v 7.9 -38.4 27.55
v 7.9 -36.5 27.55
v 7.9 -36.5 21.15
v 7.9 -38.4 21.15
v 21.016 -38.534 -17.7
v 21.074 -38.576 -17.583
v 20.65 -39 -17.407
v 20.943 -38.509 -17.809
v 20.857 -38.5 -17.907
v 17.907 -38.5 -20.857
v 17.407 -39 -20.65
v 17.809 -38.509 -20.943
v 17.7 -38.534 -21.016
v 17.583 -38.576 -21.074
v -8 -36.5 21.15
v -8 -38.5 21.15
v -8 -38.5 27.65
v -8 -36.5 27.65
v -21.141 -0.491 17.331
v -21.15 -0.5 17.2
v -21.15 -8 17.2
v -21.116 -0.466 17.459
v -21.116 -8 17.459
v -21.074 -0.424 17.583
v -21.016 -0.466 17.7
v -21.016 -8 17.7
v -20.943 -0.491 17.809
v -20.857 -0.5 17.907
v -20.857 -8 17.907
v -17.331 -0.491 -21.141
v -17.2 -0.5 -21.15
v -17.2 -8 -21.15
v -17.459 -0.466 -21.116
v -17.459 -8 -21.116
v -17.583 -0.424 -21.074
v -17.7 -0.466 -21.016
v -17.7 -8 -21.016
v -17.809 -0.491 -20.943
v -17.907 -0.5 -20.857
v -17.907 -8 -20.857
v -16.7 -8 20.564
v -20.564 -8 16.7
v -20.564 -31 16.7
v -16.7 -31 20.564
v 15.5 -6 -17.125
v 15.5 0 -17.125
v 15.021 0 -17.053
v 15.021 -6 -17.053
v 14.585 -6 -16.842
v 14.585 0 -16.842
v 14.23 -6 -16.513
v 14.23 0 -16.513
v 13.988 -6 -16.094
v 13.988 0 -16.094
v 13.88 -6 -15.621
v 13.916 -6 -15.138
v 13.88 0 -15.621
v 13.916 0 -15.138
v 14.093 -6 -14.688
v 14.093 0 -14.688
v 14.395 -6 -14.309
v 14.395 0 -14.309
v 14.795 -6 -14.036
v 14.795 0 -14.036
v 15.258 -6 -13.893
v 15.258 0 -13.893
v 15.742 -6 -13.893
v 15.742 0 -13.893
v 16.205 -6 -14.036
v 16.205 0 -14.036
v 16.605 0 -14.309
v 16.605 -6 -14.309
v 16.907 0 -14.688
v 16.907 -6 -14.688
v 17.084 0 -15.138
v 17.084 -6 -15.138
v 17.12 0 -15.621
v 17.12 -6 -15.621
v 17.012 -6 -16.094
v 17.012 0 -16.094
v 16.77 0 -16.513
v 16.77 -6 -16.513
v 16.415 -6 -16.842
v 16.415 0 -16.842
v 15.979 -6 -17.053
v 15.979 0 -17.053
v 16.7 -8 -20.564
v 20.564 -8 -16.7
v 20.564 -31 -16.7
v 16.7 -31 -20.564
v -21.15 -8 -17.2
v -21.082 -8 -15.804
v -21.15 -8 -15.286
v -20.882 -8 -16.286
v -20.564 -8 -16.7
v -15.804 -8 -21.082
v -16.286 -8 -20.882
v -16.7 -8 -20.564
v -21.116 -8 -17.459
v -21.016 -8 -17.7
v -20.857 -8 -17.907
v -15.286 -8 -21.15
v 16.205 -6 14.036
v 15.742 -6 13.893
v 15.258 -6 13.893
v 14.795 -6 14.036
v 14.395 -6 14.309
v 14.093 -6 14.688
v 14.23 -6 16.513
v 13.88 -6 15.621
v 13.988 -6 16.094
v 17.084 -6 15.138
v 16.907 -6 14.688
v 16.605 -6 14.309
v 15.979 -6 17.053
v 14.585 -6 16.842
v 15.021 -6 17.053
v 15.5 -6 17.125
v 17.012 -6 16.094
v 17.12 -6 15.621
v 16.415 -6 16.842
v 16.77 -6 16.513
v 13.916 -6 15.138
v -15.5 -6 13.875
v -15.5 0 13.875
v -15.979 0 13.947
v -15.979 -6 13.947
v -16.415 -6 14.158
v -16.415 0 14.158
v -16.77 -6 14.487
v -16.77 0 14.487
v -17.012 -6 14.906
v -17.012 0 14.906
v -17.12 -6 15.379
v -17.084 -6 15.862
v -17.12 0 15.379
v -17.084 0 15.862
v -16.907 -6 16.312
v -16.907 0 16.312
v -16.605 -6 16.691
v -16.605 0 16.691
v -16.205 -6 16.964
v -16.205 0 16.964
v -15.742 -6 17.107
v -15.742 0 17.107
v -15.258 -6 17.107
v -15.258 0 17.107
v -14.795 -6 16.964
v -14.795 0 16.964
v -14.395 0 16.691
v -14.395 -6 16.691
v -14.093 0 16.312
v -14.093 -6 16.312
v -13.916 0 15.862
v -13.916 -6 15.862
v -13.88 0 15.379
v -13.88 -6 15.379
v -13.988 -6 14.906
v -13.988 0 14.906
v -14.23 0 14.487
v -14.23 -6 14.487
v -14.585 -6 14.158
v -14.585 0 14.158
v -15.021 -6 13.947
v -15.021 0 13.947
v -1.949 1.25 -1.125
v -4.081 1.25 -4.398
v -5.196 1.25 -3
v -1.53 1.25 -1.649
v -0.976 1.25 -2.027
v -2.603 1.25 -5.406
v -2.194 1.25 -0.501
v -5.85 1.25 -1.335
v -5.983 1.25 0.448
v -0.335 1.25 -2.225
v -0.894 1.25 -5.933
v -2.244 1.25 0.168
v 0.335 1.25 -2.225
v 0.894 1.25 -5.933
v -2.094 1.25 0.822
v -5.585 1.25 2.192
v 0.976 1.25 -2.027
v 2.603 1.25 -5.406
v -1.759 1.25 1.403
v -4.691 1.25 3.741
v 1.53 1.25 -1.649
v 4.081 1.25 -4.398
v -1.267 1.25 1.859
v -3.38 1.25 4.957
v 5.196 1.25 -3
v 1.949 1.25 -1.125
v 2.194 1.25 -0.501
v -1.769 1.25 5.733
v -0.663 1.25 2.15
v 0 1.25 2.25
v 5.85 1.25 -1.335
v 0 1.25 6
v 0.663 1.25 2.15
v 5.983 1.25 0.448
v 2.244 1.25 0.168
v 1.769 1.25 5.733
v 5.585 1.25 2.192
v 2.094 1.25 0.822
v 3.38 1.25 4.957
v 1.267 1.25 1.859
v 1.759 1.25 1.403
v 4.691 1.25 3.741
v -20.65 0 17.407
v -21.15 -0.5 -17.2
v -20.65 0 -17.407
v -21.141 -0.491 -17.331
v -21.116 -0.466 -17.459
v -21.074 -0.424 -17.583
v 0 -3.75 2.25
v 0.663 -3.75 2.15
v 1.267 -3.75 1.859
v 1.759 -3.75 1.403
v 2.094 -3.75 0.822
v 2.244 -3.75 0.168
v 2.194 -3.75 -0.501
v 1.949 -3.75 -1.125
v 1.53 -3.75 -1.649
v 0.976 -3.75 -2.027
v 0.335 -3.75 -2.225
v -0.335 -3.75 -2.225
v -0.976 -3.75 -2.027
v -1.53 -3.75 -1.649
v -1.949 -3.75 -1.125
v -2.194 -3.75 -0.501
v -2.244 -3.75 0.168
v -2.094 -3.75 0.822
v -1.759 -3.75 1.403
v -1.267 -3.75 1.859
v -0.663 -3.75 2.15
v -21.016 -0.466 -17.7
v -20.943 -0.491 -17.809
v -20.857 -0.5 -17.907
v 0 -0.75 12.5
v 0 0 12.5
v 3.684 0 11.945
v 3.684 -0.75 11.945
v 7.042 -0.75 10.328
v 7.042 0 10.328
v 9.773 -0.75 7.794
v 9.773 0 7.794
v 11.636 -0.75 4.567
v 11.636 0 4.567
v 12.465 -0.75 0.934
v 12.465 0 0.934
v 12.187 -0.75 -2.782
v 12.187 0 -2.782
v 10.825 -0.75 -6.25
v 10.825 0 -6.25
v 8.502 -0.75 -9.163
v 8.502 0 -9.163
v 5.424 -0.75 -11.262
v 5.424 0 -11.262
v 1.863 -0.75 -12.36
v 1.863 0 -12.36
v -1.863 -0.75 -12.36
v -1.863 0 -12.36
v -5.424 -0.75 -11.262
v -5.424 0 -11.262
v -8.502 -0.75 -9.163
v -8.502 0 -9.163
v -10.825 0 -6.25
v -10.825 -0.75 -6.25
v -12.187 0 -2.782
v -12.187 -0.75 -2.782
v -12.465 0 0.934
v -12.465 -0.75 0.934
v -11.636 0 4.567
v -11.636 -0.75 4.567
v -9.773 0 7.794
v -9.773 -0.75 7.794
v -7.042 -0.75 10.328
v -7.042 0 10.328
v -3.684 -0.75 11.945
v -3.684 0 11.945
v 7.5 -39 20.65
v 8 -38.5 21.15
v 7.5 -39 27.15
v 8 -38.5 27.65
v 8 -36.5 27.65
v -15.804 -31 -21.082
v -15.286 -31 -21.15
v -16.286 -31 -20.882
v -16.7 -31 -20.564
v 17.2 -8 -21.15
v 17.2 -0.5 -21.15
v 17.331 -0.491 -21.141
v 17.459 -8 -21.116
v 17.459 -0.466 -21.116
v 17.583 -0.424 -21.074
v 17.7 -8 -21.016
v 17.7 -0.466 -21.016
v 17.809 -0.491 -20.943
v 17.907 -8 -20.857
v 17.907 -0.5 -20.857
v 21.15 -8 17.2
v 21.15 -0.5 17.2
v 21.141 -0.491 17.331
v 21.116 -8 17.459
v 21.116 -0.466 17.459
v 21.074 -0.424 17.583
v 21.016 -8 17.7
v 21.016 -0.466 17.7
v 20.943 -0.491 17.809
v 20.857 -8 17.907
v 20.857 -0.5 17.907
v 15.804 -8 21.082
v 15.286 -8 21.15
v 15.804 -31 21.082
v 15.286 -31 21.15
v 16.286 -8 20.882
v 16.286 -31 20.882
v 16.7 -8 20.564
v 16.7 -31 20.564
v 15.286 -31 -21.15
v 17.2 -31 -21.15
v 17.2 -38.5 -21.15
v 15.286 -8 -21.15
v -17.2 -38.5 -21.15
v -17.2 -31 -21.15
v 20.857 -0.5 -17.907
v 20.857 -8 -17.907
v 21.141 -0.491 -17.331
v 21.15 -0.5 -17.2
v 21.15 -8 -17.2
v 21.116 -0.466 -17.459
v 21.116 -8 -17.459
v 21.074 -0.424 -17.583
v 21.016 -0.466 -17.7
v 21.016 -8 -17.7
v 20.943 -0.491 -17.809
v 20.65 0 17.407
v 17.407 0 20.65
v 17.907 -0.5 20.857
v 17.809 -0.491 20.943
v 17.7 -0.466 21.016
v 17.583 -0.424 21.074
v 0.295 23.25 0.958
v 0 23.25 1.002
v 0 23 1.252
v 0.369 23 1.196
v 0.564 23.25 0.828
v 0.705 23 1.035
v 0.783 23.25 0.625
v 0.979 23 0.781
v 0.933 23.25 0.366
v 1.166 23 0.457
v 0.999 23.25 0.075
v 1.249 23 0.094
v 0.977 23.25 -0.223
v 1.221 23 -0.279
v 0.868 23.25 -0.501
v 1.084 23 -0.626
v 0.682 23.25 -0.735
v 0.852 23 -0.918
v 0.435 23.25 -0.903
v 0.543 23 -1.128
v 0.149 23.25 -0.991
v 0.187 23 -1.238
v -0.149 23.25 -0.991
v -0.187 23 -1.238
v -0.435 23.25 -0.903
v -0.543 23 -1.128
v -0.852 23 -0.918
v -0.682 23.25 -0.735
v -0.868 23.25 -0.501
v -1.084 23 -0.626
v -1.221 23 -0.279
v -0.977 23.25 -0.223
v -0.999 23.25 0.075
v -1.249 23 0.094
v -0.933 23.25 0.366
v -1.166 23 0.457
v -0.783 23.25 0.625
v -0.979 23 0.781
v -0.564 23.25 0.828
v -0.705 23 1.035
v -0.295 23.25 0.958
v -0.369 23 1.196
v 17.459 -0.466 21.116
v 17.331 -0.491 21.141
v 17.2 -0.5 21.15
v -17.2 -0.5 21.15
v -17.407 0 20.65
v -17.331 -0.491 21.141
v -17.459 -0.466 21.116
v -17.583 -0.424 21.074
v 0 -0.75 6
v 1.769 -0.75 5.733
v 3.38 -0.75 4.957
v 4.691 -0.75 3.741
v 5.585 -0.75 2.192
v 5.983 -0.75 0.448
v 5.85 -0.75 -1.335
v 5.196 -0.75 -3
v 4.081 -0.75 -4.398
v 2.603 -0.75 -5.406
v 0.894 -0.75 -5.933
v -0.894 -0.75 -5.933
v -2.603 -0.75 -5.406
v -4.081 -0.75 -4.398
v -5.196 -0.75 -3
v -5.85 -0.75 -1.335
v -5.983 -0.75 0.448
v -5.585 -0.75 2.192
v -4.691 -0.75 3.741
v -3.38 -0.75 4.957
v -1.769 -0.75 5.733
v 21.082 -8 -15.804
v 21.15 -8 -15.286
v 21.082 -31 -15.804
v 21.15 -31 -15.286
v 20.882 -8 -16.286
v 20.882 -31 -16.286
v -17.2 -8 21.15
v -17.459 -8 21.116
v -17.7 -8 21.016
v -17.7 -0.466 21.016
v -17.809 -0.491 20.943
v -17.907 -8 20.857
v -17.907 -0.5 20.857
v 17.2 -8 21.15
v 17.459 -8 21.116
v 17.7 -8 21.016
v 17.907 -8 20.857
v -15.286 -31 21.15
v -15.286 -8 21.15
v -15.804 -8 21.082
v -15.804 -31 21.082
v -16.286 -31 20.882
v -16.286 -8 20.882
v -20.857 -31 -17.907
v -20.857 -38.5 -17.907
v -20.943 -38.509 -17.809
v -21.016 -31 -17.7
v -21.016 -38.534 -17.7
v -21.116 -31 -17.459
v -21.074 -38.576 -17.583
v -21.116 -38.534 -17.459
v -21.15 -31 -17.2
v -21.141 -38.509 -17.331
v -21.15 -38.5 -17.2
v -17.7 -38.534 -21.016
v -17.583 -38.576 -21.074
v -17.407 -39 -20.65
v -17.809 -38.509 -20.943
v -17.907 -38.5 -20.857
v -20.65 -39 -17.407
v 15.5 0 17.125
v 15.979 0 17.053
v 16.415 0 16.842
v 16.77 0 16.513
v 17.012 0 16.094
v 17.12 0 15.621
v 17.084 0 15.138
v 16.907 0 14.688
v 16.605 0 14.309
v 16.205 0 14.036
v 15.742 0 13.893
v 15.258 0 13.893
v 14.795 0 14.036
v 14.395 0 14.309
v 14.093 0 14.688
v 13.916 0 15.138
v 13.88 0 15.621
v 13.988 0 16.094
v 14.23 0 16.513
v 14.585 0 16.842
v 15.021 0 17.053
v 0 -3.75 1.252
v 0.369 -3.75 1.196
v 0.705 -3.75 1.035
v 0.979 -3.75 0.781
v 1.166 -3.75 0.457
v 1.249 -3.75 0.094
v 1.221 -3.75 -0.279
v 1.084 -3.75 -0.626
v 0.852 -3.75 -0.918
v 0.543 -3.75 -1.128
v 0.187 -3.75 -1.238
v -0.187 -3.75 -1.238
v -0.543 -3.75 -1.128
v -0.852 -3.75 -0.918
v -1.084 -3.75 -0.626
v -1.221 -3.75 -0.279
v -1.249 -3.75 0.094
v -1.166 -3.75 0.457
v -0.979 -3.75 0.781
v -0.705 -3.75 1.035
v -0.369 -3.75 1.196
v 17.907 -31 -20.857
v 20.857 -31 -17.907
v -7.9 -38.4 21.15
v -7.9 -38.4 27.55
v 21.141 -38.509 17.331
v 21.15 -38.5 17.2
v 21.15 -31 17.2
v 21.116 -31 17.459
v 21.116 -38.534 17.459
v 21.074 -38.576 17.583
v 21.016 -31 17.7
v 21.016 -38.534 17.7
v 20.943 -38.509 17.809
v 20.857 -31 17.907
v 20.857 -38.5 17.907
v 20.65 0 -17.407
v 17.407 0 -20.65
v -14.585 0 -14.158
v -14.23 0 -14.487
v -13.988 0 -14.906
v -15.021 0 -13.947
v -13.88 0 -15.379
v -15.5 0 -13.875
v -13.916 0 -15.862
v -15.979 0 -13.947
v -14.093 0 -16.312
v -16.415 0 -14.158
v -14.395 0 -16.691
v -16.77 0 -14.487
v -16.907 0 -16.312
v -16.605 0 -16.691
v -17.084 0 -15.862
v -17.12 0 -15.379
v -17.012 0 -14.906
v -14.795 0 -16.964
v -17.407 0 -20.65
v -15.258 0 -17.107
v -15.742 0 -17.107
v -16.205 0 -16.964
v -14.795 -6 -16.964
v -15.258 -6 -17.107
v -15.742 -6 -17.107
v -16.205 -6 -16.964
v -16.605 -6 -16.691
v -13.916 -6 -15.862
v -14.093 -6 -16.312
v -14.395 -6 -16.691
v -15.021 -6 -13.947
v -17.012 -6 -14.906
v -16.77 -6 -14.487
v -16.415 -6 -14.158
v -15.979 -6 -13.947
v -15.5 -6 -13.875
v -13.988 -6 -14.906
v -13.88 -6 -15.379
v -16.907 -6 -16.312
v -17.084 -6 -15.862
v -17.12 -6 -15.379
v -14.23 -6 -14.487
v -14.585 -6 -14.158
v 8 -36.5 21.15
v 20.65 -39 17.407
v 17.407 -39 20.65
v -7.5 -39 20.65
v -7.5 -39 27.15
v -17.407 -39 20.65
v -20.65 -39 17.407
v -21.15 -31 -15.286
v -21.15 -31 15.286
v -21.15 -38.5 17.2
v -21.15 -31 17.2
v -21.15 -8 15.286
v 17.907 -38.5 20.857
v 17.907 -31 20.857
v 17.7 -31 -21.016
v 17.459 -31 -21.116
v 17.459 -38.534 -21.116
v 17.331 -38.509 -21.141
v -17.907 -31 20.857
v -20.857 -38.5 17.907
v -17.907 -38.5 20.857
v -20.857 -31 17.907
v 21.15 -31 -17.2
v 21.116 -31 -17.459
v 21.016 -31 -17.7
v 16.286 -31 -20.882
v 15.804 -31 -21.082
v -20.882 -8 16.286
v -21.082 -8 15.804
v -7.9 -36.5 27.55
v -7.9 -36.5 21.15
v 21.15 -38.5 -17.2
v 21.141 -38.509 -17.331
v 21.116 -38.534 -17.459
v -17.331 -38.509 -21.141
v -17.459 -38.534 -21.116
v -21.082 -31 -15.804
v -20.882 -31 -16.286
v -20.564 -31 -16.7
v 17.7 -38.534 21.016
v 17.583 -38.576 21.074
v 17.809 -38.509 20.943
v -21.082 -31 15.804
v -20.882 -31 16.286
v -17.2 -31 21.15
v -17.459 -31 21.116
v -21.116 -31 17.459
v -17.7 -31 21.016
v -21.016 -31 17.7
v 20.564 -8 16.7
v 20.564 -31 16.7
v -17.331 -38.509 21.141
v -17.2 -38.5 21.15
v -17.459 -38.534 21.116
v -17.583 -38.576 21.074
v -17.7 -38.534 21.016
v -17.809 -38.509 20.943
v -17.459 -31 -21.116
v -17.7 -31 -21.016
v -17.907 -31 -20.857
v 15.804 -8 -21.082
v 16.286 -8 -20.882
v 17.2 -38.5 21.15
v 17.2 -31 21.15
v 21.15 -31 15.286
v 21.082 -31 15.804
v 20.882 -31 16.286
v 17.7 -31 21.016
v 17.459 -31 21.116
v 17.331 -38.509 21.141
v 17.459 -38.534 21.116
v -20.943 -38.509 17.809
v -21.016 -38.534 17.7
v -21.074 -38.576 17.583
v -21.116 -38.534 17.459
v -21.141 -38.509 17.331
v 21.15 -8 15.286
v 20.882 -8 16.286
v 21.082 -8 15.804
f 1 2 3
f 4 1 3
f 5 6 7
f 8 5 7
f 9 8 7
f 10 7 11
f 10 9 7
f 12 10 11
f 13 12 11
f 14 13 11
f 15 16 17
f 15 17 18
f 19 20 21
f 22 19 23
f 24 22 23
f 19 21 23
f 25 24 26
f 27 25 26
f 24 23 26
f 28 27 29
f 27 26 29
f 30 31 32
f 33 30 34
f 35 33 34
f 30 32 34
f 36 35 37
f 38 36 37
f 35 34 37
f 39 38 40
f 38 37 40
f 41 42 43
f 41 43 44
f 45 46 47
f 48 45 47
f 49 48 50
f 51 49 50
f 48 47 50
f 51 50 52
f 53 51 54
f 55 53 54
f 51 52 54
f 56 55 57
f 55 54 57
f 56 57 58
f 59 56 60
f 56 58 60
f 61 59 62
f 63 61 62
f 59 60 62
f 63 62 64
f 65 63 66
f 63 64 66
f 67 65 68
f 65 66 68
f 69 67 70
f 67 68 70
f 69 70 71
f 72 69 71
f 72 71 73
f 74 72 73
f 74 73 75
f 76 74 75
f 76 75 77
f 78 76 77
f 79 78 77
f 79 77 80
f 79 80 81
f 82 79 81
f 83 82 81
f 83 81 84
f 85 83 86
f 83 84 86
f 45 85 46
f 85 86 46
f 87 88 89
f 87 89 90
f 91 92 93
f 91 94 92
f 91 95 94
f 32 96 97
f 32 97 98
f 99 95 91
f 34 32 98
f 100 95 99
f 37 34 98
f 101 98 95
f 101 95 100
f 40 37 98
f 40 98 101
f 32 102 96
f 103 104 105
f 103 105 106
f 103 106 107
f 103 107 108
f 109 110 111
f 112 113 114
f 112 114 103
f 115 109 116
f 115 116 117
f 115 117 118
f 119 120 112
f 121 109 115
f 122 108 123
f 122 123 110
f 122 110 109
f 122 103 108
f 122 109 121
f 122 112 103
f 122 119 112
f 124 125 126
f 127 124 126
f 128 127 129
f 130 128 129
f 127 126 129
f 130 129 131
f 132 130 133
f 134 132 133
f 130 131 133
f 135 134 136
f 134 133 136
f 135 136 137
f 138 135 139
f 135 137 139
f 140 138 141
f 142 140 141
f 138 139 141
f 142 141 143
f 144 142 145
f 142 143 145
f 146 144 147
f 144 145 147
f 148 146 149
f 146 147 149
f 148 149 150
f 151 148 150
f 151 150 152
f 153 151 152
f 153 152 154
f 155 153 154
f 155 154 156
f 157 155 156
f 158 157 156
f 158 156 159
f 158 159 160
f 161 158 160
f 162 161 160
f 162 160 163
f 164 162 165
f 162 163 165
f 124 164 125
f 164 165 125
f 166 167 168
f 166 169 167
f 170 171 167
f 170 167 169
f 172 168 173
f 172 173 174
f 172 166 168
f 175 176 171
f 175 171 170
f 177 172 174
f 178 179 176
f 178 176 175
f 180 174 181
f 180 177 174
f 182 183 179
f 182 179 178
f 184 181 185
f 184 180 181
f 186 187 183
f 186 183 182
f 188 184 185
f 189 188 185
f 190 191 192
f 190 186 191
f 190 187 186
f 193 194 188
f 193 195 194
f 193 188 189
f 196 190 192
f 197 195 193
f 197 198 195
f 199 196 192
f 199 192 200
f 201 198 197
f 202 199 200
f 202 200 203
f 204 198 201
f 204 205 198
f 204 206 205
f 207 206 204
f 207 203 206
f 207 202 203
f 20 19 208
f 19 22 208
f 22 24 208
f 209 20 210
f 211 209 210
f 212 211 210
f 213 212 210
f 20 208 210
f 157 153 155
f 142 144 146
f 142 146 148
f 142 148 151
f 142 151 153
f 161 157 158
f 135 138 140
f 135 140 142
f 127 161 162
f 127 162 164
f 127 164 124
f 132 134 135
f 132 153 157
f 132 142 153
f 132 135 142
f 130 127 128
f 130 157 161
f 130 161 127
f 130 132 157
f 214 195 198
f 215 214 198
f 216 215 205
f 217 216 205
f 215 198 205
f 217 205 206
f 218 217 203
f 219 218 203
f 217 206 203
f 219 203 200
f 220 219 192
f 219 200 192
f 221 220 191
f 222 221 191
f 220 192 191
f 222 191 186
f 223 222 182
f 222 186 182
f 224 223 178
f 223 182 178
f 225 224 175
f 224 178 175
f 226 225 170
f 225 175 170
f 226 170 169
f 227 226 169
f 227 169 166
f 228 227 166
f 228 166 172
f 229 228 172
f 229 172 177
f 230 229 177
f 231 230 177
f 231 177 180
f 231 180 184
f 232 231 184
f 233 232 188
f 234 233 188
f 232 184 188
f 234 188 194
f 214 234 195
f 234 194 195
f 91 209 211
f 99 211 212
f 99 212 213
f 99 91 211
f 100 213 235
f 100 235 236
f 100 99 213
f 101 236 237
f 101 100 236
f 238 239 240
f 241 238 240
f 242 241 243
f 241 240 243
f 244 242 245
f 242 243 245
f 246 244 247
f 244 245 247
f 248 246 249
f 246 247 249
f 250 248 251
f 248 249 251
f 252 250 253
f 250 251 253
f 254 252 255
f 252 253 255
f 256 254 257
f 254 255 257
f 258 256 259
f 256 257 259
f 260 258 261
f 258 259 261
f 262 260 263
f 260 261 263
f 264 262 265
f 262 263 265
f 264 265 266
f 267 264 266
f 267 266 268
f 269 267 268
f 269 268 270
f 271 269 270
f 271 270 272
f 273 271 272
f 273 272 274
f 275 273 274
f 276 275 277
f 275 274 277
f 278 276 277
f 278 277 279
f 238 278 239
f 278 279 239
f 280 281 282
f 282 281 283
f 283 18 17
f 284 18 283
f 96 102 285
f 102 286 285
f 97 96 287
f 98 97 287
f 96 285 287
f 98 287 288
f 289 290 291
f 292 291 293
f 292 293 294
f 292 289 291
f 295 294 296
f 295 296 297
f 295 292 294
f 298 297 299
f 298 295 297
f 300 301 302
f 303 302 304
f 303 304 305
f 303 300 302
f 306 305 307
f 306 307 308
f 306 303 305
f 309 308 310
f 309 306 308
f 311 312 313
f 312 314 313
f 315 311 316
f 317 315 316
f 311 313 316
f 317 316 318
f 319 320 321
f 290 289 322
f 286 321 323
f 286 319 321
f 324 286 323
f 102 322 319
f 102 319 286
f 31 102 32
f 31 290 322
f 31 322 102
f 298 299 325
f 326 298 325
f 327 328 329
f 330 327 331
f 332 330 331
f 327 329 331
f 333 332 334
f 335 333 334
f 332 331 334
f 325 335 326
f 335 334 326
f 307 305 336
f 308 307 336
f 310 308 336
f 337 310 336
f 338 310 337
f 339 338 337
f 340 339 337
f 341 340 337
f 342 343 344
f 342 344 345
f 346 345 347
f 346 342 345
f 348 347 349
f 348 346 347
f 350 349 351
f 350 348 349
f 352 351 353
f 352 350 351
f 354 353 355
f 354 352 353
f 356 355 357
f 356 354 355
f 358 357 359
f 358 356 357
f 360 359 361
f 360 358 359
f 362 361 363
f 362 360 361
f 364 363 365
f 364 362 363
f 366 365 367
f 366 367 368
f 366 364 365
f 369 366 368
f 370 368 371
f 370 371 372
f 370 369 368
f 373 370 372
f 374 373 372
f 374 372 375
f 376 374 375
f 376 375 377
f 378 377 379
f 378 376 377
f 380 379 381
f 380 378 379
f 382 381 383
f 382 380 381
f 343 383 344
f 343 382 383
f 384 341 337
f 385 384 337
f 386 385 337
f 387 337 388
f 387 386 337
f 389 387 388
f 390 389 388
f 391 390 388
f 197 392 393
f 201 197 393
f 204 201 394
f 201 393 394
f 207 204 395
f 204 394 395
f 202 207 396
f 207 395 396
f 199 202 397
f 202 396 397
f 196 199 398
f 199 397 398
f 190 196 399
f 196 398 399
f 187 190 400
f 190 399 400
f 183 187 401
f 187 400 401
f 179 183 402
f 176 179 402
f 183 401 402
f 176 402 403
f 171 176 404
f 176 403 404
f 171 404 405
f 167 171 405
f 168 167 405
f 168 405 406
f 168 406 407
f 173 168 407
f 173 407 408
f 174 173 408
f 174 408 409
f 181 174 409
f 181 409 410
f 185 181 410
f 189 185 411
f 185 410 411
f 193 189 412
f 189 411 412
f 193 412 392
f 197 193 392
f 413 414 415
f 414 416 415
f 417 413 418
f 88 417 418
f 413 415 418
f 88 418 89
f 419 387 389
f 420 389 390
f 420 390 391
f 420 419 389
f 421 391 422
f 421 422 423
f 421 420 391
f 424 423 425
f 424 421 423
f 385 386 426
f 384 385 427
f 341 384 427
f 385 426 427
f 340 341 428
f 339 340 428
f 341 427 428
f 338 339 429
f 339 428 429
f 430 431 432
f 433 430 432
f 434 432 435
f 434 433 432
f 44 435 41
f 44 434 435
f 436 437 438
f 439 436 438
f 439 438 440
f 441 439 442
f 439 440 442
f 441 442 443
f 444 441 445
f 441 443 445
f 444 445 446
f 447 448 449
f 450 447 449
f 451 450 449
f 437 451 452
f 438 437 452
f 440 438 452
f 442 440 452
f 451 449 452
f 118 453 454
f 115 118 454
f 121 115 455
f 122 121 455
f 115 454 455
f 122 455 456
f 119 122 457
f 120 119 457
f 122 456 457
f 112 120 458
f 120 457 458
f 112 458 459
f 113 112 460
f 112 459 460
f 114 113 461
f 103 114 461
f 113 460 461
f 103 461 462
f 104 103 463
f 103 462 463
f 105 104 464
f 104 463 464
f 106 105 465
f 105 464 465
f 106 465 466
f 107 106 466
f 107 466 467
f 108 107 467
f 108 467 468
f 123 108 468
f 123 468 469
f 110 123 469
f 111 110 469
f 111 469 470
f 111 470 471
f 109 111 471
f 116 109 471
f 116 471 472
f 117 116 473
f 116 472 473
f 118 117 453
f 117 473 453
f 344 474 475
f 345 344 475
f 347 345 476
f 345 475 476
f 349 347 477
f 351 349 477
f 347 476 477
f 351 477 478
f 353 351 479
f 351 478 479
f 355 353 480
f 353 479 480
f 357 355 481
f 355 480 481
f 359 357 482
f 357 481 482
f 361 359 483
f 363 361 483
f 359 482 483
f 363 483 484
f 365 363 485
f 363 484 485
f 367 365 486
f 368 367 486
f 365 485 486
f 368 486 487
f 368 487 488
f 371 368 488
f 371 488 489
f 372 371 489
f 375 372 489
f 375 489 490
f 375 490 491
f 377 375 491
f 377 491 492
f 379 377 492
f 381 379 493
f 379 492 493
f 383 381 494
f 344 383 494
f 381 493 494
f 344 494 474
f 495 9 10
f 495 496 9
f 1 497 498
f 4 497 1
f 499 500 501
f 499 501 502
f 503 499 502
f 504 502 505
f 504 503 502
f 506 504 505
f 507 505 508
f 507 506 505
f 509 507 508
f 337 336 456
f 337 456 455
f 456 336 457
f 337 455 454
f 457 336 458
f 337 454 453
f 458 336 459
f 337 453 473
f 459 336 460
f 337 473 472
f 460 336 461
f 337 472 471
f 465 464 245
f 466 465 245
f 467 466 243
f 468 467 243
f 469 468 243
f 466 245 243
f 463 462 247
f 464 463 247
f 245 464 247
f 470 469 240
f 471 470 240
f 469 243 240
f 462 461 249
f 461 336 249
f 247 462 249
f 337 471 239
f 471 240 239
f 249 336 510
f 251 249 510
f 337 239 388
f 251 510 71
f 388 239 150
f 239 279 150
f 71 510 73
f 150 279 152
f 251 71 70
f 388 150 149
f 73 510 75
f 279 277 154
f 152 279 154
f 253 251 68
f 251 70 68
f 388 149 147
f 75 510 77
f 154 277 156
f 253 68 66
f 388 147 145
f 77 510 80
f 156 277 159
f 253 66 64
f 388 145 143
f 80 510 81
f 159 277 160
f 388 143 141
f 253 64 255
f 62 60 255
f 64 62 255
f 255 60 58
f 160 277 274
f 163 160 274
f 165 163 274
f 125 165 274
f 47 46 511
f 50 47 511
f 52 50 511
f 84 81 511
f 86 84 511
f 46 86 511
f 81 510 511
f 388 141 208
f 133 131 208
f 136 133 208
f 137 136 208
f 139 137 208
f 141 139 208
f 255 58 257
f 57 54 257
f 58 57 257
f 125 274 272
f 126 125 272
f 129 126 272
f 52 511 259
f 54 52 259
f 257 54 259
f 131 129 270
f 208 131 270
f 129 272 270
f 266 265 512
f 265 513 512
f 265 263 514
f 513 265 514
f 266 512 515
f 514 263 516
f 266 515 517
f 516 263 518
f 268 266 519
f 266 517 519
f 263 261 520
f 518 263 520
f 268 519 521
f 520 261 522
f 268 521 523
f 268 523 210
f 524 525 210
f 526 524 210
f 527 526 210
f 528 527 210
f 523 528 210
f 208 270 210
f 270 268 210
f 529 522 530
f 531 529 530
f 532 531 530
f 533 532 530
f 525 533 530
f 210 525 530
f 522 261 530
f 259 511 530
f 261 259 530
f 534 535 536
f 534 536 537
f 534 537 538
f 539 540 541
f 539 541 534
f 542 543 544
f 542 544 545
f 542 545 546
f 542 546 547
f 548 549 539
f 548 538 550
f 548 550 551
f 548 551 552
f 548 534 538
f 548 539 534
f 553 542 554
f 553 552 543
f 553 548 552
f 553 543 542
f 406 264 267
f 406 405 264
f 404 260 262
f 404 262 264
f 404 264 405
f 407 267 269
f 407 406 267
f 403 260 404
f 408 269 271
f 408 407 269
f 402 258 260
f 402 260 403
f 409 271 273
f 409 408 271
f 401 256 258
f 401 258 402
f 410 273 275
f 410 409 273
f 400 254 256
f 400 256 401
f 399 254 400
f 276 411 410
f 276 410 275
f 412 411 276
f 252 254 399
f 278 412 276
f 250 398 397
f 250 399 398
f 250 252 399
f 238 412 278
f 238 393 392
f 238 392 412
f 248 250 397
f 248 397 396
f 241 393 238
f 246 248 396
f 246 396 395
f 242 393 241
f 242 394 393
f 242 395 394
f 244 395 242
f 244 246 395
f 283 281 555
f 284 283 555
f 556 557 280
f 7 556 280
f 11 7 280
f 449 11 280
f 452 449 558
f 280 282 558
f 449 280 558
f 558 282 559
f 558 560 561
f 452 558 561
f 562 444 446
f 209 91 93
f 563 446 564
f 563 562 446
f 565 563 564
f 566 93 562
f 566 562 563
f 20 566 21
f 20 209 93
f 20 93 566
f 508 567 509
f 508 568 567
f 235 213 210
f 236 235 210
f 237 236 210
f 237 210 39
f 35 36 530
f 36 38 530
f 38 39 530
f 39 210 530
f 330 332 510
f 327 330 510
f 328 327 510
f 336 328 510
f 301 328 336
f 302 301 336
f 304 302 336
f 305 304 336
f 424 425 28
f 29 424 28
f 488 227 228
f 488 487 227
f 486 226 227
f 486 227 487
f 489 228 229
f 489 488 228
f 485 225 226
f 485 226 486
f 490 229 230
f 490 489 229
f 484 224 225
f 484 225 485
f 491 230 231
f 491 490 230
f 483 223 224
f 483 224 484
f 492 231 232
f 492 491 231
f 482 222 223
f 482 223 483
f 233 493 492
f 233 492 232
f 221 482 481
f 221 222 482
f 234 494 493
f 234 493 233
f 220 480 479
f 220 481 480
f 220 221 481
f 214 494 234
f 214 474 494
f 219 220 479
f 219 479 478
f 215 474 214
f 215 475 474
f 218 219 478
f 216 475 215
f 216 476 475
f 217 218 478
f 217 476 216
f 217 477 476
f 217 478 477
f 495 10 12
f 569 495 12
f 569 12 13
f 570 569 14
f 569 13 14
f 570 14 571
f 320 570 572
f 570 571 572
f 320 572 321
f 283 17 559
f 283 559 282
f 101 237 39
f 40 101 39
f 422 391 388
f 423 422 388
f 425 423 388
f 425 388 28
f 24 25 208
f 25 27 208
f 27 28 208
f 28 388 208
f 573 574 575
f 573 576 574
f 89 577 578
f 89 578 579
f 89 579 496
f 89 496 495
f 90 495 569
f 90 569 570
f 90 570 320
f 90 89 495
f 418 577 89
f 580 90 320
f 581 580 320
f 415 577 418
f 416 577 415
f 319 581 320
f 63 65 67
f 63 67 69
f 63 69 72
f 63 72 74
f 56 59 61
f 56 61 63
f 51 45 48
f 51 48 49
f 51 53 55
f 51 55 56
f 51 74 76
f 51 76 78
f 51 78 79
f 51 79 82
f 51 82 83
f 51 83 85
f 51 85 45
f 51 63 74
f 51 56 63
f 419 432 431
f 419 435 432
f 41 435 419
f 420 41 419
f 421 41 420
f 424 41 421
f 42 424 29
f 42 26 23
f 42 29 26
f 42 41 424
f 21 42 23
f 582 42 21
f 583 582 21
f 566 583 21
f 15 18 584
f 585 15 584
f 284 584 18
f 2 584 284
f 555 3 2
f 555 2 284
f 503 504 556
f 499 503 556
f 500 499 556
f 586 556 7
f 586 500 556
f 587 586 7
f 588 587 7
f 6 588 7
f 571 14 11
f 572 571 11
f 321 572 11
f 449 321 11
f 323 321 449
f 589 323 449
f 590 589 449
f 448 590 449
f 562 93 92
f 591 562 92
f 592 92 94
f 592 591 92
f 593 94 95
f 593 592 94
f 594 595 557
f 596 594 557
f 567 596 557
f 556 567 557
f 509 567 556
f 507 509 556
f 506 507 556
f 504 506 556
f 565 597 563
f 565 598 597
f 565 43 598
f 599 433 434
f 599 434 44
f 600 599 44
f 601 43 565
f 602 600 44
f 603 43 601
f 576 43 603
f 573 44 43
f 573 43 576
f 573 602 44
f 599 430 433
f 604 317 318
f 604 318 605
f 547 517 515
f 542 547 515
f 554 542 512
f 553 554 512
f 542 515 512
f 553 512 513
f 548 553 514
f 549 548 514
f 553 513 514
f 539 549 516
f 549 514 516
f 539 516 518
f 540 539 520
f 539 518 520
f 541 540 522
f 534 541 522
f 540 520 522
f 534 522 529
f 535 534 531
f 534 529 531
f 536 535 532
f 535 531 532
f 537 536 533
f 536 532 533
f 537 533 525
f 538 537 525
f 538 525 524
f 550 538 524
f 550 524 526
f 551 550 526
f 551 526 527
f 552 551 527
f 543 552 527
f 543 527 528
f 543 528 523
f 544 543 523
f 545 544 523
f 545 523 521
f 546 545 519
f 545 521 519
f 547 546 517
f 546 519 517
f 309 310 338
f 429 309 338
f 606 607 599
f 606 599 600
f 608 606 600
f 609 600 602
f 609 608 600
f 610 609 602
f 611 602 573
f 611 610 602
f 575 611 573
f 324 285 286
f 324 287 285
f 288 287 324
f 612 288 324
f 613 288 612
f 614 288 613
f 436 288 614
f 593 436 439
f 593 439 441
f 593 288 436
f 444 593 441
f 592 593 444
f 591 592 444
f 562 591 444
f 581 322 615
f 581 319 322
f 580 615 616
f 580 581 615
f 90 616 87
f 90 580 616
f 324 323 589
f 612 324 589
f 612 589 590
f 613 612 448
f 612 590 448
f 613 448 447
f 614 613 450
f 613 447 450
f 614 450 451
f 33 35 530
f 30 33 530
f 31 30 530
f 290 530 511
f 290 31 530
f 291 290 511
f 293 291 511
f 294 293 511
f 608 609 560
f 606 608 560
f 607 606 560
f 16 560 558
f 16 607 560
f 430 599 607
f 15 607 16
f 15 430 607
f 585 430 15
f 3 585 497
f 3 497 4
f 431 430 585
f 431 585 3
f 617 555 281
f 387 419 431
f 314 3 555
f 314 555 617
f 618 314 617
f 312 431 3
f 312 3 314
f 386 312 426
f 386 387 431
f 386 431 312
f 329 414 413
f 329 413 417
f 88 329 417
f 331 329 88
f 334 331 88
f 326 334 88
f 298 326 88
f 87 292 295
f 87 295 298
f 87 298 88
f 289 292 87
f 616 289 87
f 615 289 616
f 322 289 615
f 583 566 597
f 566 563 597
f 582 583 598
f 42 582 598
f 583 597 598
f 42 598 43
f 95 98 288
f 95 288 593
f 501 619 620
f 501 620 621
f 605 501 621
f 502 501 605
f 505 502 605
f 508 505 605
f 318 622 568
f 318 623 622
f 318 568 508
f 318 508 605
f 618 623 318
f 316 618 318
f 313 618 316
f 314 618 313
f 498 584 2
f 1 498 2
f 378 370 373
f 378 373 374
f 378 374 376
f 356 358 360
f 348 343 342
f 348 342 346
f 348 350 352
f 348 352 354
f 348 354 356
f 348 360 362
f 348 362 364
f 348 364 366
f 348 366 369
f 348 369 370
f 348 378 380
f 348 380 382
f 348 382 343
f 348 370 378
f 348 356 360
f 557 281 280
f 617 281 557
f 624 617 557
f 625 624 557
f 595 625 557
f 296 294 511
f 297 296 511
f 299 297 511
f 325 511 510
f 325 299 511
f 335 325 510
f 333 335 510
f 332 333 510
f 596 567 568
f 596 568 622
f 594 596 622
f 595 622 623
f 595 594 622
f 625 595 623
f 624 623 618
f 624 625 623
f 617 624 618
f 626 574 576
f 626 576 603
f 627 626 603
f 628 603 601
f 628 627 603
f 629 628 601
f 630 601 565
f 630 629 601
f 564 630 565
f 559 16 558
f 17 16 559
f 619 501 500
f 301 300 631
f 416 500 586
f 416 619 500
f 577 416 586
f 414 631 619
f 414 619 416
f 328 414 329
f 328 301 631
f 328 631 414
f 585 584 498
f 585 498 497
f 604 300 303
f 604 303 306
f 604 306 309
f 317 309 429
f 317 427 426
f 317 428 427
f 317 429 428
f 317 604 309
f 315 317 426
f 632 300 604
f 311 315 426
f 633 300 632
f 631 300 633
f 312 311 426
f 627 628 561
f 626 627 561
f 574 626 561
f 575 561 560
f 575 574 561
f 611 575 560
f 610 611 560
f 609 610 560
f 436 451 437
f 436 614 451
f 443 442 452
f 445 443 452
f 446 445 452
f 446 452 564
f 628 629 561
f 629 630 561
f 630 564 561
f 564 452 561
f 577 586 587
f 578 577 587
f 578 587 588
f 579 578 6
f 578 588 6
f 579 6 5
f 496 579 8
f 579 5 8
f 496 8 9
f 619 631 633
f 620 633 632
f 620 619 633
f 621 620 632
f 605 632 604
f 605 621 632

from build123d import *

# Parameters (mm, degrees)
BOSS_EXTRUDE1_DEPTH  = 8
SKETCH2_R            = 1.624765057
CUT_EXTRUDE1_DEPTH   = 6
CHAMFER1_SIZE        = 0.5
SKETCH3_W            = 32.228932188
SKETCH3_H            = 1
CUT_EXTRUDE2_DEPTH   = 48.964700562
SKETCH4_W            = 32.228932188
SKETCH4_H            = 1
CUT_EXTRUDE3_DEPTH   = 48.964700562
CUT_EXTRUDE4_DEPTH   = 1
MIRROR2_COPY_1_DEPTH = 1
BOSS_EXTRUDE2_DEPTH  = 24
BOSS_EXTRUDE4_DEPTH  = 8
SKETCH22_W           = 16
SKETCH22_H           = 2.5
BOSS_EXTRUDE5_DEPTH  = 6.5
CHAMFER3_SIZE        = 0.5
SKETCH23_W           = 15.8
SKETCH23_H           = 6.4
CUT_EXTRUDE5_DEPTH   = 1.9
SKETCH24_R           = 12.5
CUT_EXTRUDE6_DEPTH   = 0.75
SKETCH25_R           = 6
BOSS_EXTRUDE6_DEPTH  = 2
SKETCH26_R           = 2.25
CUT_EXTRUDE7_DEPTH   = 5
SKETCH27_R           = 1.25207439
BOSS_EXTRUDE7_DEPTH  = 27
CHAMFER5_SIZE        = 0.25
FILLET1_R            = 2
FILLET3_R            = 1
FILLET4_R            = 1


with BuildPart() as part:
    # Sketch1 → Boss-Extrude1 (new body)
    with BuildSketch(Plane(origin=(0, 0, 0), x_dir=(1, 0, 0), z_dir=(0, 1, 0))):
        Polygon((-21.15, -17.614466094), (-21.15, 17.614466094), (-17.614466094, 21.15), (17.614466094, 21.15), (21.15, 17.614466094), (21.15, -17.614466094), (17.614466094, -21.15), (-17.614466094, -21.15), align=None)
    extrude(amount=-BOSS_EXTRUDE1_DEPTH)

    # Sketch2 → Cut-Extrude1 (cut)
    with BuildSketch(Plane(origin=(0, 0, 0), x_dir=(1, 0, 0), z_dir=(0, 1, 0))):
        with Locations(Location((-15.5, 15.5, 0), (0, 0, 270))):
            Circle(SKETCH2_R)
        with Locations(Location((15.5, 15.5, 0), (0, 0, 90))):
            Circle(SKETCH2_R)
        with Locations(Location((15.5, -15.5, 0), (0, 0, 270))):
            Circle(SKETCH2_R)
        with Locations(Location((-15.5, -15.5, 0), (0, 0, 90))):
            Circle(SKETCH2_R)
    extrude(amount=-CUT_EXTRUDE1_DEPTH, mode=Mode.SUBTRACT)

    # Chamfer1
    chamfer1_edges = [part.edges().sort_by_distance(p)[0] for p in [
        (21.15, 0, 0),
        (19.382233047, 0, 19.382233047),
        (0, 0, 21.15),
        (-19.382233047, 0, 19.382233047),
        (-21.15, 0, 0),
        (-19.382233047, 0, -19.382233047),
        (0, 0, -21.15),
        (19.382233047, 0, -19.382233047),
    ]]
    chamfer(chamfer1_edges, length=CHAMFER1_SIZE)

    # Sketch3 → Cut-Extrude2 (cut, through all)
    with BuildSketch(Plane(origin=(21.15, 0, 0), x_dir=(0, 0, -1), z_dir=(1, 0, 0))):
        with Locations((0, -7.5)):
            Rectangle(SKETCH3_W, SKETCH3_H)
    extrude(amount=-CUT_EXTRUDE2_DEPTH, mode=Mode.SUBTRACT)

    # Sketch4 → Cut-Extrude3 (cut, through all)
    with BuildSketch(Plane.XY.offset(21.15)):
        with Locations((0, -7.5)):
            Rectangle(SKETCH4_W, SKETCH4_H)
    extrude(amount=-CUT_EXTRUDE3_DEPTH, mode=Mode.SUBTRACT)

    # Sketch5 → Cut-Extrude4 (cut)
    with BuildSketch(Plane.XZ.offset(8)):
        Polygon((-21.15, 16.114466094), (-16.114466094, 21.15), (-16.114466094, 16.114466094), align=None)
    cut_extrude4 = extrude(amount=-CUT_EXTRUDE4_DEPTH, mode=Mode.SUBTRACT)

    # Mirror1: Cut-Extrude4 across plane
    add(cut_extrude4.mirror(Plane(origin=(0, 0, 0), x_dir=(0, 0, 1), z_dir=(1, 0, 0))), mode=Mode.SUBTRACT)

    # Mirror2: Cut-Extrude4 across plane
    add(cut_extrude4.mirror(Plane.XY), mode=Mode.SUBTRACT)

    # Mirror2 copy 1 sketch → Mirror2 copy 1 (cut)
    with BuildSketch(Plane(origin=(0, -8, 0), x_dir=(-1, 0, 0), z_dir=(0, -1, 0))):
        Polygon((-21.15, 16.114466094), (-16.114466094, 21.15), (-16.114466094, 16.114466094), align=None)
    extrude(amount=-MIRROR2_COPY_1_DEPTH, mode=Mode.SUBTRACT)

    # Sketch6 → Boss-Extrude2 (add)
    with BuildSketch(Plane.XZ.offset(7)):
        Polygon((-21.15, -16.114466094), (-21.15, 16.114466094), (-16.114466094, 21.15), (16.114466094, 21.15), (21.15, 16.114466094), (21.15, -16.114466094), (16.114466094, -21.15), (-16.114466094, -21.15), align=None)
    extrude(amount=BOSS_EXTRUDE2_DEPTH)

    # Sketch16 → Boss-Extrude4 (add)
    with BuildSketch(Plane.XZ.offset(31)):
        Polygon((-21.15, -17.614466094), (-21.15, 17.614466094), (-17.614466094, 21.15), (17.614466094, 21.15), (21.15, 17.614466094), (21.15, -17.614466094), (17.614466094, -21.15), (-17.614466094, -21.15), align=None)
    extrude(amount=BOSS_EXTRUDE4_DEPTH)

    # Sketch22 → Boss-Extrude5 (add)
    with BuildSketch(Plane.XY.offset(21.15)):
        with Locations((0, -37.75)):
            Rectangle(SKETCH22_W, SKETCH22_H)
    extrude(amount=BOSS_EXTRUDE5_DEPTH)

    # Chamfer3
    chamfer3_edges = [part.edges().sort_by_distance(p)[0] for p in [
        (-19.382233047, -39, -19.382233047),
        (0, -39, -21.15),
        (19.382233047, -39, -19.382233047),
        (21.15, -39, 0),
        (19.382233047, -39, 19.382233047),
        (12.807233047, -39, 21.15),
        (-19.382233047, -39, 19.382233047),
        (-21.15, -39, 0),
        (-12.807233047, -39, 21.15),
        (-8, -39, 24.4),
        (8, -39, 24.4),
        (0, -39, 27.65),
    ]]
    chamfer(chamfer3_edges, length=CHAMFER3_SIZE)

    # Sketch23 → Cut-Extrude5 (cut)
    with BuildSketch(Plane(origin=(0, -36.5, 0), x_dir=(1, 0, 0), z_dir=(0, 1, 0))):
        with Locations((0, -24.35)):
            Rectangle(SKETCH23_W, SKETCH23_H)
    extrude(amount=-CUT_EXTRUDE5_DEPTH, mode=Mode.SUBTRACT)

    # Sketch24 → Cut-Extrude6 (cut)
    with BuildSketch(Plane(origin=(0, 0, 0), x_dir=(1, 0, 0), z_dir=(0, 1, 0))):
        with Locations(Location((0, 0, 0), (0, 0, 270))):
            Circle(SKETCH24_R)
    extrude(amount=-CUT_EXTRUDE6_DEPTH, mode=Mode.SUBTRACT)

    # Sketch25 → Boss-Extrude6 (add)
    with BuildSketch(Plane(origin=(0, -0.75, 0), x_dir=(1, 0, 0), z_dir=(0, 1, 0))):
        with Locations(Location((0, 0, 0), (0, 0, 270))):
            Circle(SKETCH25_R)
    extrude(amount=BOSS_EXTRUDE6_DEPTH)

    # Sketch26 → Cut-Extrude7 (cut)
    with BuildSketch(Plane(origin=(0, 1.25, 0), x_dir=(1, 0, 0), z_dir=(0, 1, 0))):
        with Locations(Location((0, 0, 0), (0, 0, 270))):
            Circle(SKETCH26_R)
    extrude(amount=-CUT_EXTRUDE7_DEPTH, mode=Mode.SUBTRACT)

    # Sketch27 → Boss-Extrude7 (add)
    with BuildSketch(Plane(origin=(0, -3.75, 0), x_dir=(1, 0, 0), z_dir=(0, 1, 0))):
        with Locations(Location((0, 0, 0), (0, 0, 270))):
            Circle(SKETCH27_R)
    extrude(amount=BOSS_EXTRUDE7_DEPTH)

    # Chamfer5
    chamfer5_edges = [part.edges().sort_by_distance(p)[0] for p in [
        (0, 23.25, -1.25207439),
    ]]
    chamfer(chamfer5_edges, length=CHAMFER5_SIZE)

    # Fillet1
    fillet1_edges = [part.edges().sort_by_distance(p)[0] for p in [
        (-21.15, -19.5, -16.114466094),
        (-16.114466094, -19.5, -21.15),
        (16.114466094, -19.5, -21.15),
        (21.15, -19.5, -16.114466094),
        (21.15, -19.5, 16.114466094),
        (16.114466094, -19.5, 21.15),
        (-16.114466094, -19.5, 21.15),
        (-21.15, -19.5, 16.114466094),
    ]]
    fillet(fillet1_edges, radius=FILLET1_R)

    # Fillet3
    fillet3_edges = [part.edges().sort_by_distance(p)[0] for p in [
        (-21.15, -4.25, 17.614466094),
        (-21.15, -4.25, -17.614466094),
        (-17.614466094, -4.25, -21.15),
        (17.614466094, -4.25, -21.15),
        (21.15, -4.25, -17.614466094),
        (21.15, -4.25, 17.614466094),
        (17.614466094, -4.25, 21.15),
        (-17.614466094, -4.25, 21.15),
    ]]
    fillet(fillet3_edges, radius=FILLET3_R)

    # Fillet4
    fillet4_edges = [part.edges().sort_by_distance(p)[0] for p in [
        (-21.15, -34.75, -17.614466094),
        (-21.15, -34.75, 17.614466094),
        (-17.614466094, -34.75, 21.15),
        (17.614466094, -34.75, 21.15),
        (21.15, -34.75, 17.614466094),
        (21.15, -34.75, -17.614466094),
        (17.614466094, -34.75, -21.15),
        (-17.614466094, -34.75, -21.15),
    ]]
    fillet(fillet4_edges, radius=FILLET4_R)


solid = part.part
